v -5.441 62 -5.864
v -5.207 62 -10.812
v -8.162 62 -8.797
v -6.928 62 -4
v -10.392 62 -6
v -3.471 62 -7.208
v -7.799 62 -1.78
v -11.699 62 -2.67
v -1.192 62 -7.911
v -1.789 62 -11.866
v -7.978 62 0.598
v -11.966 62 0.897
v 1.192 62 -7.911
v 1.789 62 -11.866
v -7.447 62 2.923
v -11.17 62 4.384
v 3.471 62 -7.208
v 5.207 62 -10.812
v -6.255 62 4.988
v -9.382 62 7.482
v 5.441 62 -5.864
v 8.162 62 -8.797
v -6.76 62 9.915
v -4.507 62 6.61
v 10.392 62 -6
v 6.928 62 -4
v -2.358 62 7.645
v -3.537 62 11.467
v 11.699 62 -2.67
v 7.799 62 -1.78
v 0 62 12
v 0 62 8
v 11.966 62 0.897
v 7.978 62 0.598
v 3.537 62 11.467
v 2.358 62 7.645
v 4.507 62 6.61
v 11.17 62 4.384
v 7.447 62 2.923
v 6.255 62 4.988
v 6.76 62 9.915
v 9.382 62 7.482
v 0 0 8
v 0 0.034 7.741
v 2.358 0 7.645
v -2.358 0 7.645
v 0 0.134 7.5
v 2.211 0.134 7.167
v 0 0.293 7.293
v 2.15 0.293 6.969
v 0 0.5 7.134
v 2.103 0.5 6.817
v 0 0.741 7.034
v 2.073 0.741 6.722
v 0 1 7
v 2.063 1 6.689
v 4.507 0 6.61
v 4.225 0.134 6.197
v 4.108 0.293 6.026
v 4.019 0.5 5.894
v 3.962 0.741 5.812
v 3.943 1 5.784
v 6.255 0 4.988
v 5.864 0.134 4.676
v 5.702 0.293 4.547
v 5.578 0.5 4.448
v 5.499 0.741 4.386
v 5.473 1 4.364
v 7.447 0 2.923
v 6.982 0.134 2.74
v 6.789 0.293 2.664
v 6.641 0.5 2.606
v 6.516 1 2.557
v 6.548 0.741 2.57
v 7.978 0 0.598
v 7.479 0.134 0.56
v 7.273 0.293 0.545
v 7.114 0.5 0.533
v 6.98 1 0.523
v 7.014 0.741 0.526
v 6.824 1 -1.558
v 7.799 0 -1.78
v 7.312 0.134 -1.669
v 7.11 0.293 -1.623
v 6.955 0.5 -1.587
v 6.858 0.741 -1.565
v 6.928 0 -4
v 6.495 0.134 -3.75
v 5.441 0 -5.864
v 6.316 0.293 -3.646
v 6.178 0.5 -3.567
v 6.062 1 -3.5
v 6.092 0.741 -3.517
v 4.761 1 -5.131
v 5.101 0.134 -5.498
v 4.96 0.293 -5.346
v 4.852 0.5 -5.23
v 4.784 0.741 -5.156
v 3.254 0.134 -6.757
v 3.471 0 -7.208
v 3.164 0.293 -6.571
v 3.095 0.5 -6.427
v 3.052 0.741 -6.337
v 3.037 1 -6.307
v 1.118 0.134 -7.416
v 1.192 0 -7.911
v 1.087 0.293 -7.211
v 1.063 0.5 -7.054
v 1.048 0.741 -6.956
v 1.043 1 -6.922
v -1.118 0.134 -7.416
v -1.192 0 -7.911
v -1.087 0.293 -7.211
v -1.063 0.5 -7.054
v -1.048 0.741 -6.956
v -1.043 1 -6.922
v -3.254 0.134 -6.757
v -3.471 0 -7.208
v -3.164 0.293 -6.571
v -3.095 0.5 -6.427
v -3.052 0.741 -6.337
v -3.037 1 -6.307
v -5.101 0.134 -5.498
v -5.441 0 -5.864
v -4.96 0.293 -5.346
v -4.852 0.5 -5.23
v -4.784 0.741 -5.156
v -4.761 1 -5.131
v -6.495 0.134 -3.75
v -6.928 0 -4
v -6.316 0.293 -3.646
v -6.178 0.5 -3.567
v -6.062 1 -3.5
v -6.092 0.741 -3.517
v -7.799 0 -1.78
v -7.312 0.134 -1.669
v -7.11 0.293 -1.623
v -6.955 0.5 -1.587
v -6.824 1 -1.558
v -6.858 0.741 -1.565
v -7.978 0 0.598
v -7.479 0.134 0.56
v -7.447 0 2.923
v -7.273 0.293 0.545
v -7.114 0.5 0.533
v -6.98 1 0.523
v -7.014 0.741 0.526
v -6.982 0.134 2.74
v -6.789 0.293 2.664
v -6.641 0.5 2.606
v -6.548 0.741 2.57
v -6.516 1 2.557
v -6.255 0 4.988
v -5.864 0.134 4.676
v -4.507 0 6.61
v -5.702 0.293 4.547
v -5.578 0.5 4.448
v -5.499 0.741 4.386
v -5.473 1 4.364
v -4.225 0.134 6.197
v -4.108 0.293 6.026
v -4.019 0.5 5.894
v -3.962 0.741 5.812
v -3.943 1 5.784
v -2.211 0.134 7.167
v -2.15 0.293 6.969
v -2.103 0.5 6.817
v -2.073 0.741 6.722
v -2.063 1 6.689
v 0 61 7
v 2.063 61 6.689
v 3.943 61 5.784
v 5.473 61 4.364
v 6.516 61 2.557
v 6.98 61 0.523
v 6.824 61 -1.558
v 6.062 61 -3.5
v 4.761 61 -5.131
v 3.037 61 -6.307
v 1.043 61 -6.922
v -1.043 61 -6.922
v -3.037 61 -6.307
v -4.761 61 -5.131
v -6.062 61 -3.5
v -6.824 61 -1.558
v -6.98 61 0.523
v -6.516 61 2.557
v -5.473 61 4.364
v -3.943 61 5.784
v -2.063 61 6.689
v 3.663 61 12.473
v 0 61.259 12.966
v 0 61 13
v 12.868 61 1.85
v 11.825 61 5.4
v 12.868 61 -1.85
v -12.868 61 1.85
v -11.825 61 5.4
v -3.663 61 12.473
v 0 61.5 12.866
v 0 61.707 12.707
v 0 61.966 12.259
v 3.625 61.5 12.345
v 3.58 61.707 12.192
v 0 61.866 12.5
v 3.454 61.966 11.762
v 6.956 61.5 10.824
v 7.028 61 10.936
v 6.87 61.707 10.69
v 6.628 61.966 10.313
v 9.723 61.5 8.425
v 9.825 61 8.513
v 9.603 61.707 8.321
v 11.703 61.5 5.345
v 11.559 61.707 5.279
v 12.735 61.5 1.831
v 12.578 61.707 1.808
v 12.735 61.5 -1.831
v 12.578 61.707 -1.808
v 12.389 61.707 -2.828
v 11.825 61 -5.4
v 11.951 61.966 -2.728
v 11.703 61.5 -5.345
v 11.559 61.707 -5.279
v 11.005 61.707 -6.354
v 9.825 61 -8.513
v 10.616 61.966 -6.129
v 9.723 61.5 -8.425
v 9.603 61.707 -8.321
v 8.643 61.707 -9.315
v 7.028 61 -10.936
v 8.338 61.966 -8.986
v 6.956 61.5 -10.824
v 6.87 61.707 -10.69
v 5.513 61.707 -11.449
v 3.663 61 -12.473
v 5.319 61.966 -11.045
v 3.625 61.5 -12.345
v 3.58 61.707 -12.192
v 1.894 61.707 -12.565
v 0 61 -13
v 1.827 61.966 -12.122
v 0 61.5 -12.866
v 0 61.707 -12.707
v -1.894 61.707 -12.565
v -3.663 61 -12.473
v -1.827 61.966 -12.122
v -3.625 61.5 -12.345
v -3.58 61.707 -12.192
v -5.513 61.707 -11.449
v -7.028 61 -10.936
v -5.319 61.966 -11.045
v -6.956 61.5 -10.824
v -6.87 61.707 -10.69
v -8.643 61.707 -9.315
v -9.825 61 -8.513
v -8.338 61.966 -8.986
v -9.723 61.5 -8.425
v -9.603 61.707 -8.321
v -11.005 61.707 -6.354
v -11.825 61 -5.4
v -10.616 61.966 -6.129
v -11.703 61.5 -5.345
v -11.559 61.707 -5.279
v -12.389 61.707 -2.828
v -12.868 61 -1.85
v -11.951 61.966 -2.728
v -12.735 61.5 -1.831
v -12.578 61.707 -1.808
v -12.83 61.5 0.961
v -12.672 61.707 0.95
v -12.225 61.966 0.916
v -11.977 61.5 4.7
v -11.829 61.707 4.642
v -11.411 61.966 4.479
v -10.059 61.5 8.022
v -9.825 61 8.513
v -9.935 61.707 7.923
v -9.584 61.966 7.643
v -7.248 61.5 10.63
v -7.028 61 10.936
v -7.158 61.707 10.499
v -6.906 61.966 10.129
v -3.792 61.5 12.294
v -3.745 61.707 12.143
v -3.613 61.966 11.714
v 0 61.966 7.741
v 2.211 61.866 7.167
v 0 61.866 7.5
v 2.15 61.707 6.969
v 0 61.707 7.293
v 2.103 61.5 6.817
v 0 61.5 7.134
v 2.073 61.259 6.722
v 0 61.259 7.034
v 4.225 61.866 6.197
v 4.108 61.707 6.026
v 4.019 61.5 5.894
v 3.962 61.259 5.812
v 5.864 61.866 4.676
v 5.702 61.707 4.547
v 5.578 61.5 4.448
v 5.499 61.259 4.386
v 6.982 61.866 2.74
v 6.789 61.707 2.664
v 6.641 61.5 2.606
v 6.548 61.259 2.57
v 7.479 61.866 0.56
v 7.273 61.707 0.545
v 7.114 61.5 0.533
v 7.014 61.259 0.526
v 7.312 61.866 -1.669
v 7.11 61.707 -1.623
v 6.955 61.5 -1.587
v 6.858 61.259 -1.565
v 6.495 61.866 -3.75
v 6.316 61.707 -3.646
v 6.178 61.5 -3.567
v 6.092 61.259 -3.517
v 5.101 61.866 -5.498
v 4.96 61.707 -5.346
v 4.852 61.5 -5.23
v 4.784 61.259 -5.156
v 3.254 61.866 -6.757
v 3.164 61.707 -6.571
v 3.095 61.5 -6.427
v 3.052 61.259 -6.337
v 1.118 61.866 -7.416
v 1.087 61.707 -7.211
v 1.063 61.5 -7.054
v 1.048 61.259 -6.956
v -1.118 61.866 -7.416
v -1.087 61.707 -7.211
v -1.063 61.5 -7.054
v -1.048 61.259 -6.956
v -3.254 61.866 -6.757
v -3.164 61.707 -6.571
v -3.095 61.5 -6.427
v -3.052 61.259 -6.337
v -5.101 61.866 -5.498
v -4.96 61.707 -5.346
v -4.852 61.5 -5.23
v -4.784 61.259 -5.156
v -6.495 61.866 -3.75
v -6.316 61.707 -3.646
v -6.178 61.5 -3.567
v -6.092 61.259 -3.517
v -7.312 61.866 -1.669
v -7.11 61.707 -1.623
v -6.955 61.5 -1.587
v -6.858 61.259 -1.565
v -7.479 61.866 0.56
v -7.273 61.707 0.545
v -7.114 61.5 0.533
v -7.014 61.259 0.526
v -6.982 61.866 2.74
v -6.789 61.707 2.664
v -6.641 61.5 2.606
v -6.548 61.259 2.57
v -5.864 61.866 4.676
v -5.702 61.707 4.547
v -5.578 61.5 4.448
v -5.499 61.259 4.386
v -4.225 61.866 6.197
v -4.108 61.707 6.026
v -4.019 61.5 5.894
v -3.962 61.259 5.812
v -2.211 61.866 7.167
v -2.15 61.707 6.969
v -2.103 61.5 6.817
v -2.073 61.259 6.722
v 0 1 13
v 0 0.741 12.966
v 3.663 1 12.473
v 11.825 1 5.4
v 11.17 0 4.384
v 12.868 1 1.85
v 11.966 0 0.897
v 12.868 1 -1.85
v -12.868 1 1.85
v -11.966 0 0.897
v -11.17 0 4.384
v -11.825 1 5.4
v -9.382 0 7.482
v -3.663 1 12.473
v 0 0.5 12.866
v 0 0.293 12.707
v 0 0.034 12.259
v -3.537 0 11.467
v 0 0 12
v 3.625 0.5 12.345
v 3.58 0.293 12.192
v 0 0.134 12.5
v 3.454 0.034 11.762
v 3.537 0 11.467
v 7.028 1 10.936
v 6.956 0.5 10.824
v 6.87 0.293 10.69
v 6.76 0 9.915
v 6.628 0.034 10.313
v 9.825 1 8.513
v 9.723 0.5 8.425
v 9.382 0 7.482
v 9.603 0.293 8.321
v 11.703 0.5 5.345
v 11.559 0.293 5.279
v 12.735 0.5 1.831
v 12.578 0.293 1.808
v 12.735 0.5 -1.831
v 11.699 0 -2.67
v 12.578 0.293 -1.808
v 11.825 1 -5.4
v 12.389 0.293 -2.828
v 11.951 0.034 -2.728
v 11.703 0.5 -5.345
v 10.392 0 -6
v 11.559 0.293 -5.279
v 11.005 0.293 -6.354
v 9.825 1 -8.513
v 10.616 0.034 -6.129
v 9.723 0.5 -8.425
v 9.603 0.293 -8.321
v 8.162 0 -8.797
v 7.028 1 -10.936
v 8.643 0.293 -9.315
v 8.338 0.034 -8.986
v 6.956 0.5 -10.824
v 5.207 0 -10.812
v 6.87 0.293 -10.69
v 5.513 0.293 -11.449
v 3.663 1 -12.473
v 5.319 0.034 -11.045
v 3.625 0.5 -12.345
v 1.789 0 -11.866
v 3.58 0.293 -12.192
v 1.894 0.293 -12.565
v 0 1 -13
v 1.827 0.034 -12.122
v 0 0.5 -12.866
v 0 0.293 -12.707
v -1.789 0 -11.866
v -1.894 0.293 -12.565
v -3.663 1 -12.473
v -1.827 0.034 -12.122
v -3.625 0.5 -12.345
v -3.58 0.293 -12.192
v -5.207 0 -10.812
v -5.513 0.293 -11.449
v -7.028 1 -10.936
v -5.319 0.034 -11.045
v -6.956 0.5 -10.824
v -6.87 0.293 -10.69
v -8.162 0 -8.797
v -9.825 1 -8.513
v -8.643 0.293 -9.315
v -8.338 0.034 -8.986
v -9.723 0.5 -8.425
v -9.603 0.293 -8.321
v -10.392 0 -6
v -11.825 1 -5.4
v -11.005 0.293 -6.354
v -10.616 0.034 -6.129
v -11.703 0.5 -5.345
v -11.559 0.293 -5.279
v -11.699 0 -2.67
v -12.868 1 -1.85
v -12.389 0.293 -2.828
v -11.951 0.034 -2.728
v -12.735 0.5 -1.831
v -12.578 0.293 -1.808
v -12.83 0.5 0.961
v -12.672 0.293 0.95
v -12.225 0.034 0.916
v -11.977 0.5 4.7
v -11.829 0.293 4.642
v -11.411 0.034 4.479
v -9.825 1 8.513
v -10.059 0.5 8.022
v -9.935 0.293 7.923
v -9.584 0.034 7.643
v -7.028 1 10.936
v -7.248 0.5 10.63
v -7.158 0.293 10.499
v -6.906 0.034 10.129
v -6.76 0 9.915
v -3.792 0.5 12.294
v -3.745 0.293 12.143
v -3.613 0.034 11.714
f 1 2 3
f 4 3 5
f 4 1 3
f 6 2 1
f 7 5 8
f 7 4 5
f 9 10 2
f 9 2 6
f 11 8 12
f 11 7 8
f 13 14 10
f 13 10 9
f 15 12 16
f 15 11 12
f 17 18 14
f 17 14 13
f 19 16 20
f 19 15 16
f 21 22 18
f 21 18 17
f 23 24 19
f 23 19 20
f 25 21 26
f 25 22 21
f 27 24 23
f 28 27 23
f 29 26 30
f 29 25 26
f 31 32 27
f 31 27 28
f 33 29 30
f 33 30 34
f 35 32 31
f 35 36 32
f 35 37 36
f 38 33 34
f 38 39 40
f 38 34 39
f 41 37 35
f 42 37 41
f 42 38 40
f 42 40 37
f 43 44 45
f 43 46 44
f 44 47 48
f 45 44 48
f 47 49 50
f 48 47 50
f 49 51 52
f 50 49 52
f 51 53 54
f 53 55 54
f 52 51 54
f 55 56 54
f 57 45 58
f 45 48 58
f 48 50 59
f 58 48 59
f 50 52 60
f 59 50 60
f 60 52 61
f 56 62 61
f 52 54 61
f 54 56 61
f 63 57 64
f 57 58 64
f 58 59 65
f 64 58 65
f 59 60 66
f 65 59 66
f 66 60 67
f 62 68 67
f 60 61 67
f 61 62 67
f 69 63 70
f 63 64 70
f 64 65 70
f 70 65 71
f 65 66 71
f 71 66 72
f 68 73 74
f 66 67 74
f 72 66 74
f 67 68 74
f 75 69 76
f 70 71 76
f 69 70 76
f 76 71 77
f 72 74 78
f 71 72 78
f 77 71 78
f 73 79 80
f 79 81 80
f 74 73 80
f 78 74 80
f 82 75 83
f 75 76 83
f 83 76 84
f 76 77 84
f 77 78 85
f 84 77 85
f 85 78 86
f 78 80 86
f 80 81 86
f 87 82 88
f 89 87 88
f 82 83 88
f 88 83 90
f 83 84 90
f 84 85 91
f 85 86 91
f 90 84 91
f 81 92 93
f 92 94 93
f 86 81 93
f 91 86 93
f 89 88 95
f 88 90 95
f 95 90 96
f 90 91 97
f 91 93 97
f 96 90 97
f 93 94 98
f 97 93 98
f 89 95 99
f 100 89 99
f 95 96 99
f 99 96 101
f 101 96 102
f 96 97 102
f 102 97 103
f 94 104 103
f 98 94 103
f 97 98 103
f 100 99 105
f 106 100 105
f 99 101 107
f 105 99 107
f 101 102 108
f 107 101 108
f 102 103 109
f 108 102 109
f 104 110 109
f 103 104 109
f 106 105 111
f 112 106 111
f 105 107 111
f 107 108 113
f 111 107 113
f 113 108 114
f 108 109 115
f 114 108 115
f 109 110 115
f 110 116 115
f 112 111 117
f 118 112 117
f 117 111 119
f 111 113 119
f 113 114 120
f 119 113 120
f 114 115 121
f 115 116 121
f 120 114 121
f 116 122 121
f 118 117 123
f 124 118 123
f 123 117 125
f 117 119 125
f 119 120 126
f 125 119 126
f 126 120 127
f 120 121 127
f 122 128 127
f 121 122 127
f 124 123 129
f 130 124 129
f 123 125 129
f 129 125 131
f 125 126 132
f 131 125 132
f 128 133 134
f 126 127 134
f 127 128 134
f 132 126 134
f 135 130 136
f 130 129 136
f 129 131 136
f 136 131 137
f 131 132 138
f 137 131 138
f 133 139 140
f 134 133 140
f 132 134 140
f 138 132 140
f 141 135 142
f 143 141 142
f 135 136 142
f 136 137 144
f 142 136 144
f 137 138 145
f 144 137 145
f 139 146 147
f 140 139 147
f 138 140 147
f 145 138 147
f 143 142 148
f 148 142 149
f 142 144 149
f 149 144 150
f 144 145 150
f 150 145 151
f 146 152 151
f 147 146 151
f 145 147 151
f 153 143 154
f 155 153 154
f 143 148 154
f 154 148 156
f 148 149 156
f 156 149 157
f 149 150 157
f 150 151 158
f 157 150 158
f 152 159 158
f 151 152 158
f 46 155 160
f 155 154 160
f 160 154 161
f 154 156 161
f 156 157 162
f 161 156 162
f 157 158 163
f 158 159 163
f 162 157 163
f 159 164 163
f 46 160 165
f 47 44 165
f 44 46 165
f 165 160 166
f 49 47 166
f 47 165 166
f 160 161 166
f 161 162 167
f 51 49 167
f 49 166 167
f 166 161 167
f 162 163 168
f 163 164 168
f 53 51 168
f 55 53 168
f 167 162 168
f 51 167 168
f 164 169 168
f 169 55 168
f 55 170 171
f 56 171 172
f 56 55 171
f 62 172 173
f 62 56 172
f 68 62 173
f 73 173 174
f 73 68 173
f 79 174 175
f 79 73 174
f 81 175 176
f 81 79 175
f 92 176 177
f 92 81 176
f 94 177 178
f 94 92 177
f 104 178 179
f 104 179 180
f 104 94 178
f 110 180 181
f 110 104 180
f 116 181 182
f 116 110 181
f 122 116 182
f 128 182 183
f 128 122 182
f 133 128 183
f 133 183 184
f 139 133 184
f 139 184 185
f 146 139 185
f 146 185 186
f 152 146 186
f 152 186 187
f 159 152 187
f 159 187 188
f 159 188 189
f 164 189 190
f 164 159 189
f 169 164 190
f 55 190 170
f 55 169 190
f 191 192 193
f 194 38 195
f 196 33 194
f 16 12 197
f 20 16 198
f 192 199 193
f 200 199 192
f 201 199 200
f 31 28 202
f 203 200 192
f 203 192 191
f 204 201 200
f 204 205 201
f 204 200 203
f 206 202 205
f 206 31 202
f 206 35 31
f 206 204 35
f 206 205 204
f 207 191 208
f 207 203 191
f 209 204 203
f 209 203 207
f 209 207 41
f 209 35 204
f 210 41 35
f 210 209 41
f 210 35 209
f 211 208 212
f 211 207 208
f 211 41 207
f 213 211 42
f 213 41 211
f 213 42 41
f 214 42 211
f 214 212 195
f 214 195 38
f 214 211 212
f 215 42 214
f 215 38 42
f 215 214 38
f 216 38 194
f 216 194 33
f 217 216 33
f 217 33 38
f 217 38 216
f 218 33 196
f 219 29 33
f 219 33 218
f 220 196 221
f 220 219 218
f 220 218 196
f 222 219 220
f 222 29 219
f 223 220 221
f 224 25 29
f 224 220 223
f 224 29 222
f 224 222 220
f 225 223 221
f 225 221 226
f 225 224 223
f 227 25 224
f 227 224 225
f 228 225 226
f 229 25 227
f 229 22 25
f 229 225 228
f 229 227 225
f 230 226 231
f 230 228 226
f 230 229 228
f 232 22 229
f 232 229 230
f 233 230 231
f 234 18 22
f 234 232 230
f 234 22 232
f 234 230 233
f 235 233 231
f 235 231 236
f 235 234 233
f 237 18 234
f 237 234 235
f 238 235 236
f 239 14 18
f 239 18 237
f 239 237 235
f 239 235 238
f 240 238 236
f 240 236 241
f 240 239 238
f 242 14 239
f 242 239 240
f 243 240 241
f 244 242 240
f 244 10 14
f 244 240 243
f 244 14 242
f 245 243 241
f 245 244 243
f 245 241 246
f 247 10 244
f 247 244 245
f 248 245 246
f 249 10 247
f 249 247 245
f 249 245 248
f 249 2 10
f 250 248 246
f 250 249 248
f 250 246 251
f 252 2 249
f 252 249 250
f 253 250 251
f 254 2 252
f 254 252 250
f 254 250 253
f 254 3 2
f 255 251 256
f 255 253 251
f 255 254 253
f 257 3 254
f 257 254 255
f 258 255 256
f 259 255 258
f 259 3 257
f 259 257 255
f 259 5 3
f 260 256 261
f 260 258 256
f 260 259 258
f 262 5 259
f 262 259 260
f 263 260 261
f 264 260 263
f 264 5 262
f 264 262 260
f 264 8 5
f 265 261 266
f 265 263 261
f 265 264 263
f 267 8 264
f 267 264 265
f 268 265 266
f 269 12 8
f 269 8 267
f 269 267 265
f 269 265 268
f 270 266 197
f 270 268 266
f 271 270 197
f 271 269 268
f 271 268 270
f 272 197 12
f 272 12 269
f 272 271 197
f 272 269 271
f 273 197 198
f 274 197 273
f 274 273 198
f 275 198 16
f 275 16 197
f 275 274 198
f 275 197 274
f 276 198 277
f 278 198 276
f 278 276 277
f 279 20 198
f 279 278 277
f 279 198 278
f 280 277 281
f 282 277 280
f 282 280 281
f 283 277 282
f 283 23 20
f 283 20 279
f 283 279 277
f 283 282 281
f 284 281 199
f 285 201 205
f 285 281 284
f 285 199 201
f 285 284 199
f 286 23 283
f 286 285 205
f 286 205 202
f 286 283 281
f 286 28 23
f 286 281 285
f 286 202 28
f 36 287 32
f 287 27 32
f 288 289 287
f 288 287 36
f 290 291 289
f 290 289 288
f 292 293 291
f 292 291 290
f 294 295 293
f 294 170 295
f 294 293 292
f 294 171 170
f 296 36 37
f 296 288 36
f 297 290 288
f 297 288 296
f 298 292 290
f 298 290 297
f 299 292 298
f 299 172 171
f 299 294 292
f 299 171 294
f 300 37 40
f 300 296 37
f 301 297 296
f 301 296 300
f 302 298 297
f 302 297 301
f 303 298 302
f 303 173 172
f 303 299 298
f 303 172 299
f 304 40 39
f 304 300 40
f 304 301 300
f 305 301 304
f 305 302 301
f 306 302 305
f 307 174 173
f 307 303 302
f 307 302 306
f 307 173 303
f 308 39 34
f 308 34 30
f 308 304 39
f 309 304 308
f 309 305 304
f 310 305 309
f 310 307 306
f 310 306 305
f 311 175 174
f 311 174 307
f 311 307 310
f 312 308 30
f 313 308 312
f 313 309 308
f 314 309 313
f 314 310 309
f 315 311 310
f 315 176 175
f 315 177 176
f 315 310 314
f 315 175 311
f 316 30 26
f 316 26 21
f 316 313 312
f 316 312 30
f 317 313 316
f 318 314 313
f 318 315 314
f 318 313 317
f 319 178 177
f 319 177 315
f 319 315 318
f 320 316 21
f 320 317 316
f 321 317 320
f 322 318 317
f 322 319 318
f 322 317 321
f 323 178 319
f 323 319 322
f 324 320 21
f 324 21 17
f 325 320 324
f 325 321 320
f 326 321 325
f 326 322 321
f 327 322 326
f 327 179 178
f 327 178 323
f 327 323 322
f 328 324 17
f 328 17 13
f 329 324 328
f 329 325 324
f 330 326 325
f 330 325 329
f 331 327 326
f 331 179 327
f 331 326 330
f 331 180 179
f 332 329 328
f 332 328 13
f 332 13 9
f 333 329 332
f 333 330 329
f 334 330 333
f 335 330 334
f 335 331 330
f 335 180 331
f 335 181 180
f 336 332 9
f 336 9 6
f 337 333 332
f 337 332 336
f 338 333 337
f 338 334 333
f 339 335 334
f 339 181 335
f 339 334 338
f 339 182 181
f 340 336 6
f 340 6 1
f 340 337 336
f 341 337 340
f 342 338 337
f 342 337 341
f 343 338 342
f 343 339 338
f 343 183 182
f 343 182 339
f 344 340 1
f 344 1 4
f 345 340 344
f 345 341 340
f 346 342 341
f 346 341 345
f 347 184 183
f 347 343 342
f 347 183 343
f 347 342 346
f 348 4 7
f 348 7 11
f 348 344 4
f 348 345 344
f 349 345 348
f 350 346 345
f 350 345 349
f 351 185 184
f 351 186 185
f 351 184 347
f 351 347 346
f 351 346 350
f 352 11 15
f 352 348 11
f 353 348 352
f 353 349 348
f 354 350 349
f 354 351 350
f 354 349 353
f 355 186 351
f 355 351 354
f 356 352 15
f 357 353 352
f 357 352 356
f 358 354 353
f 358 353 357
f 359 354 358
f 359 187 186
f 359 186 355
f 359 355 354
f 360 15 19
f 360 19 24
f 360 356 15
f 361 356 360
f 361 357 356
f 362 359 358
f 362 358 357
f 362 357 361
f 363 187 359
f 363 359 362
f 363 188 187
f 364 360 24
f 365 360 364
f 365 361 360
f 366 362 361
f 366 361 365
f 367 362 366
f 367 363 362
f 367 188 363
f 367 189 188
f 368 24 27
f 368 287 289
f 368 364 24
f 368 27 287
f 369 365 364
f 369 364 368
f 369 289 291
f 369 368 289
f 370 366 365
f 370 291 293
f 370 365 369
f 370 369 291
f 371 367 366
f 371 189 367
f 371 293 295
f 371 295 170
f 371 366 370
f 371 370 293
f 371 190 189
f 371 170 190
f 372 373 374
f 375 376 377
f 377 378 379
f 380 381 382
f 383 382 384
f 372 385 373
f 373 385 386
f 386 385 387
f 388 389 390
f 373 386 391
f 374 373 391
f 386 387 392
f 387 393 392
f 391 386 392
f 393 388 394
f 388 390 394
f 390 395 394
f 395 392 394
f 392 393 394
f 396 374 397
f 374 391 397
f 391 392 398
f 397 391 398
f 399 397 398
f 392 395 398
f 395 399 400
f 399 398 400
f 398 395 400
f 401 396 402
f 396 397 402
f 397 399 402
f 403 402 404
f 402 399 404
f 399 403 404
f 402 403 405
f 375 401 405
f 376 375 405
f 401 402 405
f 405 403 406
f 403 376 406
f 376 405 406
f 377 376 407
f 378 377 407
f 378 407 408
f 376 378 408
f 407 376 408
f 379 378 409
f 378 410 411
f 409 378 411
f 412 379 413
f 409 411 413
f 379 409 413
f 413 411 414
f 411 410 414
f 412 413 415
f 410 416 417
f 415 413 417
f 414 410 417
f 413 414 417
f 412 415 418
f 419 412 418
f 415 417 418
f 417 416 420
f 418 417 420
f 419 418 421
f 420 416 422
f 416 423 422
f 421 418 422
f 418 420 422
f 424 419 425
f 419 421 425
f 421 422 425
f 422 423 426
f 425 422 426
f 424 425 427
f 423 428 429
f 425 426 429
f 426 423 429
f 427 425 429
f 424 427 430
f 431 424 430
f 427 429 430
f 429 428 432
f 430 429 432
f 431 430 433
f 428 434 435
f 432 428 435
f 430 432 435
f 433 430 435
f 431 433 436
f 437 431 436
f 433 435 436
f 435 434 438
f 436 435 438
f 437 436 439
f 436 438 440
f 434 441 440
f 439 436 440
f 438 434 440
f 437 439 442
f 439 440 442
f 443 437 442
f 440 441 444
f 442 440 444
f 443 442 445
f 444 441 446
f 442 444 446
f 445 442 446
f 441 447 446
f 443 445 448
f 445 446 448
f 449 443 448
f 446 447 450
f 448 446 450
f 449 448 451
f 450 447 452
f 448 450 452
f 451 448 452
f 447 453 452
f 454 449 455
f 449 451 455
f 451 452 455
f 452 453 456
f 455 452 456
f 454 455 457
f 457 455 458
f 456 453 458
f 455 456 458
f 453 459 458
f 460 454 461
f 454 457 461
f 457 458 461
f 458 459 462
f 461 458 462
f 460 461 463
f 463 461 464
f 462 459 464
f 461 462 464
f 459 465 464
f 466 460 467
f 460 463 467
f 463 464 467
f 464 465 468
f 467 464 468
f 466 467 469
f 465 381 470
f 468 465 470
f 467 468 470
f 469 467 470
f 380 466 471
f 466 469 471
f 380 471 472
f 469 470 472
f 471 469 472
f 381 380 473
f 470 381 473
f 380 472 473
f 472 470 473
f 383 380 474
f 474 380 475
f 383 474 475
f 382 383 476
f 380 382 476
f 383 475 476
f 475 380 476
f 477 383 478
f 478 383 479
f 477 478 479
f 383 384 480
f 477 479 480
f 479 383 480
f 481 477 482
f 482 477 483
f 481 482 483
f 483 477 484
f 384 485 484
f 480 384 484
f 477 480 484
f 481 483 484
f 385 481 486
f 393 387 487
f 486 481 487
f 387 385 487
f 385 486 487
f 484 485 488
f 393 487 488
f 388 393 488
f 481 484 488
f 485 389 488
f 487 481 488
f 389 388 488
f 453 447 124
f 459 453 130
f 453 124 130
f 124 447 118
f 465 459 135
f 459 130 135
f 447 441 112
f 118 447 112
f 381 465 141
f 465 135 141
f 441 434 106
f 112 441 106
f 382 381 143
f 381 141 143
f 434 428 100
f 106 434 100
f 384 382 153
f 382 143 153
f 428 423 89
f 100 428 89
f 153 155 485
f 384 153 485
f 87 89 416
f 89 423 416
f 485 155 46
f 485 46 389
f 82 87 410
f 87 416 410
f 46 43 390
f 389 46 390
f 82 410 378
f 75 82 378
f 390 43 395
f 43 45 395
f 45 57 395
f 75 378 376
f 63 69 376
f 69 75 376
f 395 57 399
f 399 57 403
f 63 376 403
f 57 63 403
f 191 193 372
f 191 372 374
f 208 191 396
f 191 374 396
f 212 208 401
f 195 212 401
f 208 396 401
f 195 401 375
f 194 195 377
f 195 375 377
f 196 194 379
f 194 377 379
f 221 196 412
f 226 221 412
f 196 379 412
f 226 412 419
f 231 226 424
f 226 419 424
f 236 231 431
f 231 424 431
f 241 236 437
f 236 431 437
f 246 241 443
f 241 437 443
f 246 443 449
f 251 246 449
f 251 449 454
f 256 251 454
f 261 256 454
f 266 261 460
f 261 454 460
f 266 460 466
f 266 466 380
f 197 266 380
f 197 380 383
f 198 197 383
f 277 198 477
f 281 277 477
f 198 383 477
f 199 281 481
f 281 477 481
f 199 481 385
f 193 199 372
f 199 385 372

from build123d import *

# Parameters (mm, degrees)
SKETCH1_R           = 13
SKETCH1_R_2         = 7
BOSS_EXTRUDE1_DEPTH = 62
FILLET2_R           = 1
FILLET3_R           = 1


with BuildPart() as part:
    # Sketch1 → Boss-Extrude1 (new body)
    with BuildSketch(Plane(origin=(0, 0, 0), x_dir=(1, 0, 0), z_dir=(0, 1, 0))):
        with Locations(Location((0, 0, 0), (0, 0, 270))):
            Circle(SKETCH1_R)
        with Locations(Location((0, 0, 0), (0, 0, 270))):
            Circle(SKETCH1_R_2, mode=Mode.SUBTRACT)
    extrude(amount=BOSS_EXTRUDE1_DEPTH)

    # Fillet2
    fillet2_edges = [part.edges().sort_by_distance(p)[0] for p in [
        (0, 0, -13),
        (0, 62, -13),
    ]]
    fillet(fillet2_edges, radius=FILLET2_R)

    # Fillet3
    fillet3_edges = [part.edges().sort_by_distance(p)[0] for p in [
        (0, 0, -7),
        (0, 62, -7),
    ]]
    fillet(fillet3_edges, radius=FILLET3_R)


solid = part.part
